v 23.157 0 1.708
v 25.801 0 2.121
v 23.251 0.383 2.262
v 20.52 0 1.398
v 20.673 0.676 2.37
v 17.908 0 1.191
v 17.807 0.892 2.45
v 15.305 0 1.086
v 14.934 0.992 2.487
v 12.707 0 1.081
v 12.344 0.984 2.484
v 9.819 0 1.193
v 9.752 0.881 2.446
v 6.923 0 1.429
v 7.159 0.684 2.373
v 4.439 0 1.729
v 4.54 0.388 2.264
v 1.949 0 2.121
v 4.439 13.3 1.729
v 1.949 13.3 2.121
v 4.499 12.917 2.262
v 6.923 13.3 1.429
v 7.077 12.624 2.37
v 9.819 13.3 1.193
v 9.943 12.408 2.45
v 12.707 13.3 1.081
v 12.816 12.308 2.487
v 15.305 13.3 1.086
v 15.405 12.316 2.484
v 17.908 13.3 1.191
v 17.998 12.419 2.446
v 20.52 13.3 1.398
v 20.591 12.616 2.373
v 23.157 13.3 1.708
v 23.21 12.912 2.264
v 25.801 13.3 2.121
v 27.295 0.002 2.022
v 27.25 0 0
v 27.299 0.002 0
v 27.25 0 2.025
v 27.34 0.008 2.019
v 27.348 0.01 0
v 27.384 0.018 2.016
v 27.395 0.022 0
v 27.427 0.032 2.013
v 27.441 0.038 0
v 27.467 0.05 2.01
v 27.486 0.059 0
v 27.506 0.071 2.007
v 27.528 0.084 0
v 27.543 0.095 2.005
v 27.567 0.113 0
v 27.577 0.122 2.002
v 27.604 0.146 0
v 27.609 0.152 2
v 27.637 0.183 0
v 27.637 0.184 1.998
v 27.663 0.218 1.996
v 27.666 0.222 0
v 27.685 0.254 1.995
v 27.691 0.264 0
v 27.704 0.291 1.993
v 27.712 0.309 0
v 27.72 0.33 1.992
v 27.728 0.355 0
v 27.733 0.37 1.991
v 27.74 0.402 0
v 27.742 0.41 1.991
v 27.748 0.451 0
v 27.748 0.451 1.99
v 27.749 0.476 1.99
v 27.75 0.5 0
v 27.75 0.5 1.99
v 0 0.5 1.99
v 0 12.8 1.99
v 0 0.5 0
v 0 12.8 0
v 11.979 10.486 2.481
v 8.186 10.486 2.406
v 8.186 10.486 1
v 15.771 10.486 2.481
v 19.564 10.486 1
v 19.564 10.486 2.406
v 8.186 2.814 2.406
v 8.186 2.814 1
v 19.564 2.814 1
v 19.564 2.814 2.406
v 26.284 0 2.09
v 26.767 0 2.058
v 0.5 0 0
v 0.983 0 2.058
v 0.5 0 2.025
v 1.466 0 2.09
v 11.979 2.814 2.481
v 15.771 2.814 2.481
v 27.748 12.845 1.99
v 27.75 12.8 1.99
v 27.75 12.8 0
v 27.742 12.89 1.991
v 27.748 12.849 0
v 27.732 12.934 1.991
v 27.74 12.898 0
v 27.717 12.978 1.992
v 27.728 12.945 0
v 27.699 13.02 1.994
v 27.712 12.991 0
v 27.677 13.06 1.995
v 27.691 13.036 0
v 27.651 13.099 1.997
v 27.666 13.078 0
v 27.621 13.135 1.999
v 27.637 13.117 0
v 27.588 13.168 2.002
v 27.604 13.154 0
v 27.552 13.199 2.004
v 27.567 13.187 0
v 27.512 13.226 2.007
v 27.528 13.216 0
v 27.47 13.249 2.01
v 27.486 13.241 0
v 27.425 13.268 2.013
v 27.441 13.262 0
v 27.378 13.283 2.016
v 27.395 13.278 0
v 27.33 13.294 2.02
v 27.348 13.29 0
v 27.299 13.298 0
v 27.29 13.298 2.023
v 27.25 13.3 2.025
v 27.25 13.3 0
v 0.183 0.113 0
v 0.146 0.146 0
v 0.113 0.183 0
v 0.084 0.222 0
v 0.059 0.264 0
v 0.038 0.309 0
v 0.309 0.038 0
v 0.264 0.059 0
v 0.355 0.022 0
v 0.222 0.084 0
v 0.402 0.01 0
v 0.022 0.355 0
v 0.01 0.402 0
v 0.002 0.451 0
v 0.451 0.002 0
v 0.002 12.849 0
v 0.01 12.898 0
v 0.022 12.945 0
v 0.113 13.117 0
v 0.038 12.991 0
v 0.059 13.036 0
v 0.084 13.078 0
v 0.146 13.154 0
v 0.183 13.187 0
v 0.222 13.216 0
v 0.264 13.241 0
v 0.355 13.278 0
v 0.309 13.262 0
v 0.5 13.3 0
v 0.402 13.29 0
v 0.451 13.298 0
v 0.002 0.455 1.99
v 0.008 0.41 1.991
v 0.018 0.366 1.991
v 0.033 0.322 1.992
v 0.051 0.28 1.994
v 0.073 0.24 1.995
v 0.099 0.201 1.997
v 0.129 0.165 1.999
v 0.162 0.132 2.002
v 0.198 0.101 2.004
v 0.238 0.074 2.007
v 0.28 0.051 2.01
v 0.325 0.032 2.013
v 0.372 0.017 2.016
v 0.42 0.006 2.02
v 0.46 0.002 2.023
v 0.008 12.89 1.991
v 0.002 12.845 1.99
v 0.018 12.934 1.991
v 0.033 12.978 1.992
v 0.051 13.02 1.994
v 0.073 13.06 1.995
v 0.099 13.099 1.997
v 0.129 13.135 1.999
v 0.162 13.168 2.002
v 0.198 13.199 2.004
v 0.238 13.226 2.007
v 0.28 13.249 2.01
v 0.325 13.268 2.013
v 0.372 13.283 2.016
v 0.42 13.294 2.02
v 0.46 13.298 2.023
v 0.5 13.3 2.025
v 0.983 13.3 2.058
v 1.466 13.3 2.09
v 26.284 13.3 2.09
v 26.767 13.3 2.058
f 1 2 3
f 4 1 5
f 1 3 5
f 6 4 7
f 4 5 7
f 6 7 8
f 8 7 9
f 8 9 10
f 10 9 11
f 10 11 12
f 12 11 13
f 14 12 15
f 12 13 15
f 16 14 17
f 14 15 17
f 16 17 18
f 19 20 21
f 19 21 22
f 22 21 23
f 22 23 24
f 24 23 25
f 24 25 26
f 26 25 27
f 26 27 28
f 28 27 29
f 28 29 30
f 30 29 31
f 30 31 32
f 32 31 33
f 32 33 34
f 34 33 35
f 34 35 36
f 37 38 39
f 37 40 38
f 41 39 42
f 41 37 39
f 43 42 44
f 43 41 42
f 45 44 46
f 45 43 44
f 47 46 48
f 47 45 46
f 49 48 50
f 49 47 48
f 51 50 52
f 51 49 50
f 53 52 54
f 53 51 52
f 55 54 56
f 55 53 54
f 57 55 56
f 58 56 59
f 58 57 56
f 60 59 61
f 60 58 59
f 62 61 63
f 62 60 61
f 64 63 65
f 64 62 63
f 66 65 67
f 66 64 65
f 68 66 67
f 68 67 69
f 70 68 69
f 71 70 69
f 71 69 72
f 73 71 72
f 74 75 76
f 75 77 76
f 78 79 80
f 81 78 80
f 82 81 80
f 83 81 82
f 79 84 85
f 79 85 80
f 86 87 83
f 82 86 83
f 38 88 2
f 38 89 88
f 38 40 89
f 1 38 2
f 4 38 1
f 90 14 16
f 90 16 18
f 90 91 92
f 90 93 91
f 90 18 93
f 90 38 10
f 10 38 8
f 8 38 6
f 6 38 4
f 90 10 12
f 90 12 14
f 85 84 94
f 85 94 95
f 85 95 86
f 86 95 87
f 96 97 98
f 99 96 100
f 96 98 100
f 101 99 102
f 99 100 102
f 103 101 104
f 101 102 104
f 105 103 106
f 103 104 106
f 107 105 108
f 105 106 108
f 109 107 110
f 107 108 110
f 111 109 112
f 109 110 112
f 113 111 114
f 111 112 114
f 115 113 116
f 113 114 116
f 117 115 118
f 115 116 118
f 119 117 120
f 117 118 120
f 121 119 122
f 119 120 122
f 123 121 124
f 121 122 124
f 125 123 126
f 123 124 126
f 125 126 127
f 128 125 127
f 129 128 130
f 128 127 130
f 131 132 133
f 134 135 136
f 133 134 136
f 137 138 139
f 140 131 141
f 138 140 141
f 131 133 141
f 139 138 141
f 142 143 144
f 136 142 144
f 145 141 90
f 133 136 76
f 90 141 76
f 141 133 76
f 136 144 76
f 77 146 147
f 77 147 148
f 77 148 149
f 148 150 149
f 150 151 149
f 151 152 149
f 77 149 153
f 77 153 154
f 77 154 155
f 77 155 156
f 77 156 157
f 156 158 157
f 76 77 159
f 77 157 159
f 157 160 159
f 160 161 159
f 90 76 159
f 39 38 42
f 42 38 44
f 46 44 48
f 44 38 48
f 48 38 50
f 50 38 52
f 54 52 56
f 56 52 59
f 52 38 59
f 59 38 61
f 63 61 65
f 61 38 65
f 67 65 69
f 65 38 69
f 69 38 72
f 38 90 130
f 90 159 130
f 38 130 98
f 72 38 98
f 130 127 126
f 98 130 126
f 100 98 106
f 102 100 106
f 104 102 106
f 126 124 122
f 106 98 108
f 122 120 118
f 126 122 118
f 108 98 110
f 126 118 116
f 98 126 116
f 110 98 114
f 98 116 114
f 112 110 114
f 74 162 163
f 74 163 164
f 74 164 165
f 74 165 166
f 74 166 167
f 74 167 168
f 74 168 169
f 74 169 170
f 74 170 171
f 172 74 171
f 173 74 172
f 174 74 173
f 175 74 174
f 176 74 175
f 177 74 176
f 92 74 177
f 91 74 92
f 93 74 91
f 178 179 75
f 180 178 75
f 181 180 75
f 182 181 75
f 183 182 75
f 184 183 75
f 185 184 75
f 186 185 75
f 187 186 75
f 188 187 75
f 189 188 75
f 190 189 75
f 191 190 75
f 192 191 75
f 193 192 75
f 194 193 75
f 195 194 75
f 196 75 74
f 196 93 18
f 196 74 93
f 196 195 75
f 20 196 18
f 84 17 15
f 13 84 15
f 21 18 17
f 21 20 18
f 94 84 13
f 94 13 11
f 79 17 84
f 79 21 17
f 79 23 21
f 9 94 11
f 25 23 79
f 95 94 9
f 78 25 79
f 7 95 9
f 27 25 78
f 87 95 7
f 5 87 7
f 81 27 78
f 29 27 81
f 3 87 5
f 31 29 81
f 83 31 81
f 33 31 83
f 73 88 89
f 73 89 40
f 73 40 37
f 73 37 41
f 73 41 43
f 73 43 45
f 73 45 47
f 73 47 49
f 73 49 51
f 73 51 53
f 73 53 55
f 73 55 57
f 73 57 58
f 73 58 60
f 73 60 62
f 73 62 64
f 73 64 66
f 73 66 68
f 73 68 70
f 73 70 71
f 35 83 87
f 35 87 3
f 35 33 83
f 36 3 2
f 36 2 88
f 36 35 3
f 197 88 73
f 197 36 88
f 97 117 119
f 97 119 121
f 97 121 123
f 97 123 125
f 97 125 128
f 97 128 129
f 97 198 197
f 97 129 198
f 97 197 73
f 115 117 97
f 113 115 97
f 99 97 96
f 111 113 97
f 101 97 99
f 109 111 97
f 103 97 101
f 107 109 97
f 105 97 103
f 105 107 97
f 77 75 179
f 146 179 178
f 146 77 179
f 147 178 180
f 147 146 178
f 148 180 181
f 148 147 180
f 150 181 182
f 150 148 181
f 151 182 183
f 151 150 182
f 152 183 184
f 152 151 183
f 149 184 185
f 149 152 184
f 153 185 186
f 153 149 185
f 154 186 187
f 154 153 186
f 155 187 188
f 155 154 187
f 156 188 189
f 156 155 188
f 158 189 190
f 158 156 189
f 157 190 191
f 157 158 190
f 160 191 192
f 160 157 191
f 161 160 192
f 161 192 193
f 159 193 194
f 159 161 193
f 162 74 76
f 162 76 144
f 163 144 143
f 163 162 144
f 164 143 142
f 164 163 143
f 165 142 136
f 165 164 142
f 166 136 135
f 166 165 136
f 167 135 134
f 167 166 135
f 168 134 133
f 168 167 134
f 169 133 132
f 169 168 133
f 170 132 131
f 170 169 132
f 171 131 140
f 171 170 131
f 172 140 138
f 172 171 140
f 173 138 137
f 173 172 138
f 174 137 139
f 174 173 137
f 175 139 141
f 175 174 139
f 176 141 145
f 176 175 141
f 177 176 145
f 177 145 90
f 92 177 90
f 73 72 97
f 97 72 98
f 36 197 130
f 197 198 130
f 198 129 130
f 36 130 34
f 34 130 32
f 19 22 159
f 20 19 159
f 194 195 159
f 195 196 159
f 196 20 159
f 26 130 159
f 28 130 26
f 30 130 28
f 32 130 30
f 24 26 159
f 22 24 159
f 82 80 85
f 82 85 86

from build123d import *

# Parameters (mm, degrees)
SKETCH_W           = 27.75
SKETCH_H           = 13.3
PAD_DEPTH          = 1
PAD001_DEPTH       = 1.5
PAD002_START       = -0.5
SKETCH002_W        = 47.75
SKETCH002_H        = 33.3
PAD002_DEPTH       = 0.5
CHAMFER_SIZE2      = 1.49
CHAMFER_SIZE       = 1.05
CHAMFER_FACE13_W   = 33.3
CHAMFER_FACE13_H   = 47.75
CHAMFER_FACE13_W_2 = 13.3
CHAMFER_FACE13_H_2 = 27.75
POCKET_DEPTH       = 5
POCKET001_DEPTH    = 30
FILLET_R           = 0.5
SKETCH004_W        = 11.377
SKETCH004_H        = 7.673
POCKET002_DEPTH    = 1.5


with BuildPart() as part:
    # Sketch → Pad (new body)
    with BuildSketch(Plane.XY):
        with Locations((13.875, 6.65)):
            Rectangle(SKETCH_W, SKETCH_H)
    extrude(amount=PAD_DEPTH)

    # Sketch001 (on Face6 of Pad) → Pad001 (join)
    with BuildSketch(Plane.XY.offset(1)):
        with BuildLine():
            ThreePointArc((0, 13.3), (13.875, 12.3), (27.75, 13.3))
            Line((27.75, 0), (27.75, 13.3))
            ThreePointArc((27.75, 0), (13.875, 1), (0, 0))
            Line((0, 13.3), (0, 0))
        make_face()
    extrude(amount=PAD001_DEPTH)

    # Sketch002 (on Face4 of Pad001) → Pad002 (join)
    with BuildSketch(Plane(origin=(0, 0, 0), x_dir=(1, 0, 0), z_dir=(0, 0, -1)).offset(PAD002_START)):
        with Locations((13.875, -6.65)):
            Rectangle(SKETCH002_W, SKETCH002_H)
    extrude(amount=-PAD002_DEPTH)

    # Chamfer
    chamfer_edges = [part.edges().sort_by_distance(p)[0] for p in [
        (13.875, 12.3, 1),
        (13.875, 1, 1),
    ]]
    chamfer_side = part.faces().sort_by_distance((13.875, -9.417853, 1))[0]
    chamfer(chamfer_edges, length=CHAMFER_SIZE, length2=CHAMFER_SIZE2, reference=chamfer_side)

    # Chamfer Face13 → Pocket (cut)
    with BuildSketch(Plane(origin=(13.875, 6.65, 0.5), x_dir=(0, -1, 0), z_dir=(0, 0, -1))):
        Rectangle(CHAMFER_FACE13_W, CHAMFER_FACE13_H)
        Rectangle(CHAMFER_FACE13_W_2, CHAMFER_FACE13_H_2, mode=Mode.SUBTRACT)
    extrude(amount=-POCKET_DEPTH, mode=Mode.SUBTRACT)

    # Sketch003 (on Face8 of Pocket) → Pocket001 (cut)
    with BuildSketch(Plane(origin=(0, 13.3, 0), x_dir=(-1, 0, 0), z_dir=(0, 1, 0))):
        with BuildLine():
            Line((-27.75, 2.49), (-27.75, 1.99))
            ThreePointArc((0, 1.99), (-13.875, 2.49), (-27.75, 1.99))
            Line((0, 2.49), (0, 1.99))
            Line((0, 2.99), (0, 2.49))
            Line((-27.75, 2.99), (0, 2.99))
            Line((-27.75, 2.49), (-27.75, 2.99))
        make_face()
    extrude(amount=-POCKET001_DEPTH, mode=Mode.SUBTRACT)

    # Fillet
    fillet_edges = [part.edges().sort_by_distance(p)[0] for p in [
        (27.75, 13.3, 0.995),
        (27.75, 0, 0.995),
        (0, 13.3, 0.995),
        (0, 0, 0.995),
    ]]
    fillet(fillet_edges, radius=FILLET_R)

    # Sketch004 (on Face4 of Pocket) → Pocket002 (cut)
    with BuildSketch(Plane.XY.offset(2.5)):
        with Locations((13.875, 6.65)):
            Rectangle(SKETCH004_W, SKETCH004_H)
    extrude(amount=-POCKET002_DEPTH, mode=Mode.SUBTRACT)


solid = part.part
